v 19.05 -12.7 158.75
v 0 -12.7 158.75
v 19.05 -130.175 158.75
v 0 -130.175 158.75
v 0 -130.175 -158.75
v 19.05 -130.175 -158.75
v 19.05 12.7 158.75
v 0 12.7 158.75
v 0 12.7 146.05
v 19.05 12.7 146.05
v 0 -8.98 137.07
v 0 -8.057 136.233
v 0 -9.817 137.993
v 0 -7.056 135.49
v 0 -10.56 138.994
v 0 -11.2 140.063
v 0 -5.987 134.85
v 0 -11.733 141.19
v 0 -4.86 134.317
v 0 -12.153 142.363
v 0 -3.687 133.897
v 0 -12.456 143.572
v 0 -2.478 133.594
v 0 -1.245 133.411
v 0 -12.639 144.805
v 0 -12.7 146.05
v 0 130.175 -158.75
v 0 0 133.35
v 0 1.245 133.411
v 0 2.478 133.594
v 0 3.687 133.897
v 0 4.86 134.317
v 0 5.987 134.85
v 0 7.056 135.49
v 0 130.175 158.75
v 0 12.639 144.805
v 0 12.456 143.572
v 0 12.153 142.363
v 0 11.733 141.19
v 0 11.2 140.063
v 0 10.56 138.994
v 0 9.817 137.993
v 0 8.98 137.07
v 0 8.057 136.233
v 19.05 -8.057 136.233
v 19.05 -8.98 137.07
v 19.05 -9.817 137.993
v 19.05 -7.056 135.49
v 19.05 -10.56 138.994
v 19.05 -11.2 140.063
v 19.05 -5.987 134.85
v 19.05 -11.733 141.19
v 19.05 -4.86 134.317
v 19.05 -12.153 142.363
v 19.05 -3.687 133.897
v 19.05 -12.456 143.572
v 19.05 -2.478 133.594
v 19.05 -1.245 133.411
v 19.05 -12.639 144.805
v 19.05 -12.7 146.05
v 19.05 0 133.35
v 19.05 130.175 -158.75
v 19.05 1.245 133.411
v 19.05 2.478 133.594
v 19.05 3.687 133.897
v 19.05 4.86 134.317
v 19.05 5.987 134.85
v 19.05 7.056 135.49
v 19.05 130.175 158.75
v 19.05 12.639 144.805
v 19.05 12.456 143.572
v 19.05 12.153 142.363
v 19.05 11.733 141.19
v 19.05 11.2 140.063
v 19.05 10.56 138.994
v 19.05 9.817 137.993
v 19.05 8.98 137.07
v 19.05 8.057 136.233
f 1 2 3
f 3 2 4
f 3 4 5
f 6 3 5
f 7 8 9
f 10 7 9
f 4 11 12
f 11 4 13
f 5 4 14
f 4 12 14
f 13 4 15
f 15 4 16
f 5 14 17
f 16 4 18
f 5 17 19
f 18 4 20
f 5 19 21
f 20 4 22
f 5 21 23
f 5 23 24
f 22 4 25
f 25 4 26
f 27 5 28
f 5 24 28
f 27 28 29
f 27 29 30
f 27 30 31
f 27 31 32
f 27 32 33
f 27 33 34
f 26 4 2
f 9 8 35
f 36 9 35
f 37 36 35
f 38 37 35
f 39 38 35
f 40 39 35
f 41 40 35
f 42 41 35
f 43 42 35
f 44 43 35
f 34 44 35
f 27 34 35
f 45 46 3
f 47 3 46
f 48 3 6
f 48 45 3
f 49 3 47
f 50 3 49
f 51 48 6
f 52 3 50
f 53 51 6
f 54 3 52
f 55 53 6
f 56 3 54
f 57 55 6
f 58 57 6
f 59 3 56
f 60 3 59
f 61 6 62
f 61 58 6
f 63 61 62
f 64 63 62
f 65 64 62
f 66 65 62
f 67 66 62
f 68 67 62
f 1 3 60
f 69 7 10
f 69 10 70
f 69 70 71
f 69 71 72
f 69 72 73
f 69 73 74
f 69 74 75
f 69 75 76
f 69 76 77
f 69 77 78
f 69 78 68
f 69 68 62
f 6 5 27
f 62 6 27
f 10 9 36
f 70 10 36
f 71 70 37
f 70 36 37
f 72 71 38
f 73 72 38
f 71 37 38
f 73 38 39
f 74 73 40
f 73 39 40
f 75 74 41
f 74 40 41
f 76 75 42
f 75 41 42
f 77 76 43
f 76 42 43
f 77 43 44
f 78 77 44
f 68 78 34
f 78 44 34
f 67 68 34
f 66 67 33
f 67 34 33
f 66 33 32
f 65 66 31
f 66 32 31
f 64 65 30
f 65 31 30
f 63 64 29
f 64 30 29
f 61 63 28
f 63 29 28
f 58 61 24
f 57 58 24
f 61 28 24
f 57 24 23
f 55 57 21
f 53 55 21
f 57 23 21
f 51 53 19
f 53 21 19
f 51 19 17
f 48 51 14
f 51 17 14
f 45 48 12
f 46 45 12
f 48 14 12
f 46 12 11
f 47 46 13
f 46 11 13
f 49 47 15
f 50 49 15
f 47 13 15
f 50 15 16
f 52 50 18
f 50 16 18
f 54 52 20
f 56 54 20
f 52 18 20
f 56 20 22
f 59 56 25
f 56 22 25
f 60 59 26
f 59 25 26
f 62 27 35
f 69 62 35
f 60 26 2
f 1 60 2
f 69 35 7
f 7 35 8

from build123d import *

# Parameters (mm, degrees)
F1_DEPTH = 19.05


with BuildPart() as f1:
    # F0 (on Right) → F1 (new body)
    with BuildSketch(Plane.YZ):
        with BuildLine():
            Line((130.175, -158.75), (130.175, 158.75))
            Line((130.175, 158.75), (12.7, 158.75))
            Line((12.7, 158.75), (12.7, 146.05))
            ThreePointArc((12.7, 146.05), (0, 133.35), (-12.7, 146.05))
            Line((-12.7, 146.05), (-12.7, 158.75))
            Line((-12.7, 158.75), (-130.175, 158.75))
            Line((-130.175, 158.75), (-130.175, -158.75))
            Line((-130.175, -158.75), (130.175, -158.75))
        make_face()
    extrude(amount=F1_DEPTH)


solid = f1.part
